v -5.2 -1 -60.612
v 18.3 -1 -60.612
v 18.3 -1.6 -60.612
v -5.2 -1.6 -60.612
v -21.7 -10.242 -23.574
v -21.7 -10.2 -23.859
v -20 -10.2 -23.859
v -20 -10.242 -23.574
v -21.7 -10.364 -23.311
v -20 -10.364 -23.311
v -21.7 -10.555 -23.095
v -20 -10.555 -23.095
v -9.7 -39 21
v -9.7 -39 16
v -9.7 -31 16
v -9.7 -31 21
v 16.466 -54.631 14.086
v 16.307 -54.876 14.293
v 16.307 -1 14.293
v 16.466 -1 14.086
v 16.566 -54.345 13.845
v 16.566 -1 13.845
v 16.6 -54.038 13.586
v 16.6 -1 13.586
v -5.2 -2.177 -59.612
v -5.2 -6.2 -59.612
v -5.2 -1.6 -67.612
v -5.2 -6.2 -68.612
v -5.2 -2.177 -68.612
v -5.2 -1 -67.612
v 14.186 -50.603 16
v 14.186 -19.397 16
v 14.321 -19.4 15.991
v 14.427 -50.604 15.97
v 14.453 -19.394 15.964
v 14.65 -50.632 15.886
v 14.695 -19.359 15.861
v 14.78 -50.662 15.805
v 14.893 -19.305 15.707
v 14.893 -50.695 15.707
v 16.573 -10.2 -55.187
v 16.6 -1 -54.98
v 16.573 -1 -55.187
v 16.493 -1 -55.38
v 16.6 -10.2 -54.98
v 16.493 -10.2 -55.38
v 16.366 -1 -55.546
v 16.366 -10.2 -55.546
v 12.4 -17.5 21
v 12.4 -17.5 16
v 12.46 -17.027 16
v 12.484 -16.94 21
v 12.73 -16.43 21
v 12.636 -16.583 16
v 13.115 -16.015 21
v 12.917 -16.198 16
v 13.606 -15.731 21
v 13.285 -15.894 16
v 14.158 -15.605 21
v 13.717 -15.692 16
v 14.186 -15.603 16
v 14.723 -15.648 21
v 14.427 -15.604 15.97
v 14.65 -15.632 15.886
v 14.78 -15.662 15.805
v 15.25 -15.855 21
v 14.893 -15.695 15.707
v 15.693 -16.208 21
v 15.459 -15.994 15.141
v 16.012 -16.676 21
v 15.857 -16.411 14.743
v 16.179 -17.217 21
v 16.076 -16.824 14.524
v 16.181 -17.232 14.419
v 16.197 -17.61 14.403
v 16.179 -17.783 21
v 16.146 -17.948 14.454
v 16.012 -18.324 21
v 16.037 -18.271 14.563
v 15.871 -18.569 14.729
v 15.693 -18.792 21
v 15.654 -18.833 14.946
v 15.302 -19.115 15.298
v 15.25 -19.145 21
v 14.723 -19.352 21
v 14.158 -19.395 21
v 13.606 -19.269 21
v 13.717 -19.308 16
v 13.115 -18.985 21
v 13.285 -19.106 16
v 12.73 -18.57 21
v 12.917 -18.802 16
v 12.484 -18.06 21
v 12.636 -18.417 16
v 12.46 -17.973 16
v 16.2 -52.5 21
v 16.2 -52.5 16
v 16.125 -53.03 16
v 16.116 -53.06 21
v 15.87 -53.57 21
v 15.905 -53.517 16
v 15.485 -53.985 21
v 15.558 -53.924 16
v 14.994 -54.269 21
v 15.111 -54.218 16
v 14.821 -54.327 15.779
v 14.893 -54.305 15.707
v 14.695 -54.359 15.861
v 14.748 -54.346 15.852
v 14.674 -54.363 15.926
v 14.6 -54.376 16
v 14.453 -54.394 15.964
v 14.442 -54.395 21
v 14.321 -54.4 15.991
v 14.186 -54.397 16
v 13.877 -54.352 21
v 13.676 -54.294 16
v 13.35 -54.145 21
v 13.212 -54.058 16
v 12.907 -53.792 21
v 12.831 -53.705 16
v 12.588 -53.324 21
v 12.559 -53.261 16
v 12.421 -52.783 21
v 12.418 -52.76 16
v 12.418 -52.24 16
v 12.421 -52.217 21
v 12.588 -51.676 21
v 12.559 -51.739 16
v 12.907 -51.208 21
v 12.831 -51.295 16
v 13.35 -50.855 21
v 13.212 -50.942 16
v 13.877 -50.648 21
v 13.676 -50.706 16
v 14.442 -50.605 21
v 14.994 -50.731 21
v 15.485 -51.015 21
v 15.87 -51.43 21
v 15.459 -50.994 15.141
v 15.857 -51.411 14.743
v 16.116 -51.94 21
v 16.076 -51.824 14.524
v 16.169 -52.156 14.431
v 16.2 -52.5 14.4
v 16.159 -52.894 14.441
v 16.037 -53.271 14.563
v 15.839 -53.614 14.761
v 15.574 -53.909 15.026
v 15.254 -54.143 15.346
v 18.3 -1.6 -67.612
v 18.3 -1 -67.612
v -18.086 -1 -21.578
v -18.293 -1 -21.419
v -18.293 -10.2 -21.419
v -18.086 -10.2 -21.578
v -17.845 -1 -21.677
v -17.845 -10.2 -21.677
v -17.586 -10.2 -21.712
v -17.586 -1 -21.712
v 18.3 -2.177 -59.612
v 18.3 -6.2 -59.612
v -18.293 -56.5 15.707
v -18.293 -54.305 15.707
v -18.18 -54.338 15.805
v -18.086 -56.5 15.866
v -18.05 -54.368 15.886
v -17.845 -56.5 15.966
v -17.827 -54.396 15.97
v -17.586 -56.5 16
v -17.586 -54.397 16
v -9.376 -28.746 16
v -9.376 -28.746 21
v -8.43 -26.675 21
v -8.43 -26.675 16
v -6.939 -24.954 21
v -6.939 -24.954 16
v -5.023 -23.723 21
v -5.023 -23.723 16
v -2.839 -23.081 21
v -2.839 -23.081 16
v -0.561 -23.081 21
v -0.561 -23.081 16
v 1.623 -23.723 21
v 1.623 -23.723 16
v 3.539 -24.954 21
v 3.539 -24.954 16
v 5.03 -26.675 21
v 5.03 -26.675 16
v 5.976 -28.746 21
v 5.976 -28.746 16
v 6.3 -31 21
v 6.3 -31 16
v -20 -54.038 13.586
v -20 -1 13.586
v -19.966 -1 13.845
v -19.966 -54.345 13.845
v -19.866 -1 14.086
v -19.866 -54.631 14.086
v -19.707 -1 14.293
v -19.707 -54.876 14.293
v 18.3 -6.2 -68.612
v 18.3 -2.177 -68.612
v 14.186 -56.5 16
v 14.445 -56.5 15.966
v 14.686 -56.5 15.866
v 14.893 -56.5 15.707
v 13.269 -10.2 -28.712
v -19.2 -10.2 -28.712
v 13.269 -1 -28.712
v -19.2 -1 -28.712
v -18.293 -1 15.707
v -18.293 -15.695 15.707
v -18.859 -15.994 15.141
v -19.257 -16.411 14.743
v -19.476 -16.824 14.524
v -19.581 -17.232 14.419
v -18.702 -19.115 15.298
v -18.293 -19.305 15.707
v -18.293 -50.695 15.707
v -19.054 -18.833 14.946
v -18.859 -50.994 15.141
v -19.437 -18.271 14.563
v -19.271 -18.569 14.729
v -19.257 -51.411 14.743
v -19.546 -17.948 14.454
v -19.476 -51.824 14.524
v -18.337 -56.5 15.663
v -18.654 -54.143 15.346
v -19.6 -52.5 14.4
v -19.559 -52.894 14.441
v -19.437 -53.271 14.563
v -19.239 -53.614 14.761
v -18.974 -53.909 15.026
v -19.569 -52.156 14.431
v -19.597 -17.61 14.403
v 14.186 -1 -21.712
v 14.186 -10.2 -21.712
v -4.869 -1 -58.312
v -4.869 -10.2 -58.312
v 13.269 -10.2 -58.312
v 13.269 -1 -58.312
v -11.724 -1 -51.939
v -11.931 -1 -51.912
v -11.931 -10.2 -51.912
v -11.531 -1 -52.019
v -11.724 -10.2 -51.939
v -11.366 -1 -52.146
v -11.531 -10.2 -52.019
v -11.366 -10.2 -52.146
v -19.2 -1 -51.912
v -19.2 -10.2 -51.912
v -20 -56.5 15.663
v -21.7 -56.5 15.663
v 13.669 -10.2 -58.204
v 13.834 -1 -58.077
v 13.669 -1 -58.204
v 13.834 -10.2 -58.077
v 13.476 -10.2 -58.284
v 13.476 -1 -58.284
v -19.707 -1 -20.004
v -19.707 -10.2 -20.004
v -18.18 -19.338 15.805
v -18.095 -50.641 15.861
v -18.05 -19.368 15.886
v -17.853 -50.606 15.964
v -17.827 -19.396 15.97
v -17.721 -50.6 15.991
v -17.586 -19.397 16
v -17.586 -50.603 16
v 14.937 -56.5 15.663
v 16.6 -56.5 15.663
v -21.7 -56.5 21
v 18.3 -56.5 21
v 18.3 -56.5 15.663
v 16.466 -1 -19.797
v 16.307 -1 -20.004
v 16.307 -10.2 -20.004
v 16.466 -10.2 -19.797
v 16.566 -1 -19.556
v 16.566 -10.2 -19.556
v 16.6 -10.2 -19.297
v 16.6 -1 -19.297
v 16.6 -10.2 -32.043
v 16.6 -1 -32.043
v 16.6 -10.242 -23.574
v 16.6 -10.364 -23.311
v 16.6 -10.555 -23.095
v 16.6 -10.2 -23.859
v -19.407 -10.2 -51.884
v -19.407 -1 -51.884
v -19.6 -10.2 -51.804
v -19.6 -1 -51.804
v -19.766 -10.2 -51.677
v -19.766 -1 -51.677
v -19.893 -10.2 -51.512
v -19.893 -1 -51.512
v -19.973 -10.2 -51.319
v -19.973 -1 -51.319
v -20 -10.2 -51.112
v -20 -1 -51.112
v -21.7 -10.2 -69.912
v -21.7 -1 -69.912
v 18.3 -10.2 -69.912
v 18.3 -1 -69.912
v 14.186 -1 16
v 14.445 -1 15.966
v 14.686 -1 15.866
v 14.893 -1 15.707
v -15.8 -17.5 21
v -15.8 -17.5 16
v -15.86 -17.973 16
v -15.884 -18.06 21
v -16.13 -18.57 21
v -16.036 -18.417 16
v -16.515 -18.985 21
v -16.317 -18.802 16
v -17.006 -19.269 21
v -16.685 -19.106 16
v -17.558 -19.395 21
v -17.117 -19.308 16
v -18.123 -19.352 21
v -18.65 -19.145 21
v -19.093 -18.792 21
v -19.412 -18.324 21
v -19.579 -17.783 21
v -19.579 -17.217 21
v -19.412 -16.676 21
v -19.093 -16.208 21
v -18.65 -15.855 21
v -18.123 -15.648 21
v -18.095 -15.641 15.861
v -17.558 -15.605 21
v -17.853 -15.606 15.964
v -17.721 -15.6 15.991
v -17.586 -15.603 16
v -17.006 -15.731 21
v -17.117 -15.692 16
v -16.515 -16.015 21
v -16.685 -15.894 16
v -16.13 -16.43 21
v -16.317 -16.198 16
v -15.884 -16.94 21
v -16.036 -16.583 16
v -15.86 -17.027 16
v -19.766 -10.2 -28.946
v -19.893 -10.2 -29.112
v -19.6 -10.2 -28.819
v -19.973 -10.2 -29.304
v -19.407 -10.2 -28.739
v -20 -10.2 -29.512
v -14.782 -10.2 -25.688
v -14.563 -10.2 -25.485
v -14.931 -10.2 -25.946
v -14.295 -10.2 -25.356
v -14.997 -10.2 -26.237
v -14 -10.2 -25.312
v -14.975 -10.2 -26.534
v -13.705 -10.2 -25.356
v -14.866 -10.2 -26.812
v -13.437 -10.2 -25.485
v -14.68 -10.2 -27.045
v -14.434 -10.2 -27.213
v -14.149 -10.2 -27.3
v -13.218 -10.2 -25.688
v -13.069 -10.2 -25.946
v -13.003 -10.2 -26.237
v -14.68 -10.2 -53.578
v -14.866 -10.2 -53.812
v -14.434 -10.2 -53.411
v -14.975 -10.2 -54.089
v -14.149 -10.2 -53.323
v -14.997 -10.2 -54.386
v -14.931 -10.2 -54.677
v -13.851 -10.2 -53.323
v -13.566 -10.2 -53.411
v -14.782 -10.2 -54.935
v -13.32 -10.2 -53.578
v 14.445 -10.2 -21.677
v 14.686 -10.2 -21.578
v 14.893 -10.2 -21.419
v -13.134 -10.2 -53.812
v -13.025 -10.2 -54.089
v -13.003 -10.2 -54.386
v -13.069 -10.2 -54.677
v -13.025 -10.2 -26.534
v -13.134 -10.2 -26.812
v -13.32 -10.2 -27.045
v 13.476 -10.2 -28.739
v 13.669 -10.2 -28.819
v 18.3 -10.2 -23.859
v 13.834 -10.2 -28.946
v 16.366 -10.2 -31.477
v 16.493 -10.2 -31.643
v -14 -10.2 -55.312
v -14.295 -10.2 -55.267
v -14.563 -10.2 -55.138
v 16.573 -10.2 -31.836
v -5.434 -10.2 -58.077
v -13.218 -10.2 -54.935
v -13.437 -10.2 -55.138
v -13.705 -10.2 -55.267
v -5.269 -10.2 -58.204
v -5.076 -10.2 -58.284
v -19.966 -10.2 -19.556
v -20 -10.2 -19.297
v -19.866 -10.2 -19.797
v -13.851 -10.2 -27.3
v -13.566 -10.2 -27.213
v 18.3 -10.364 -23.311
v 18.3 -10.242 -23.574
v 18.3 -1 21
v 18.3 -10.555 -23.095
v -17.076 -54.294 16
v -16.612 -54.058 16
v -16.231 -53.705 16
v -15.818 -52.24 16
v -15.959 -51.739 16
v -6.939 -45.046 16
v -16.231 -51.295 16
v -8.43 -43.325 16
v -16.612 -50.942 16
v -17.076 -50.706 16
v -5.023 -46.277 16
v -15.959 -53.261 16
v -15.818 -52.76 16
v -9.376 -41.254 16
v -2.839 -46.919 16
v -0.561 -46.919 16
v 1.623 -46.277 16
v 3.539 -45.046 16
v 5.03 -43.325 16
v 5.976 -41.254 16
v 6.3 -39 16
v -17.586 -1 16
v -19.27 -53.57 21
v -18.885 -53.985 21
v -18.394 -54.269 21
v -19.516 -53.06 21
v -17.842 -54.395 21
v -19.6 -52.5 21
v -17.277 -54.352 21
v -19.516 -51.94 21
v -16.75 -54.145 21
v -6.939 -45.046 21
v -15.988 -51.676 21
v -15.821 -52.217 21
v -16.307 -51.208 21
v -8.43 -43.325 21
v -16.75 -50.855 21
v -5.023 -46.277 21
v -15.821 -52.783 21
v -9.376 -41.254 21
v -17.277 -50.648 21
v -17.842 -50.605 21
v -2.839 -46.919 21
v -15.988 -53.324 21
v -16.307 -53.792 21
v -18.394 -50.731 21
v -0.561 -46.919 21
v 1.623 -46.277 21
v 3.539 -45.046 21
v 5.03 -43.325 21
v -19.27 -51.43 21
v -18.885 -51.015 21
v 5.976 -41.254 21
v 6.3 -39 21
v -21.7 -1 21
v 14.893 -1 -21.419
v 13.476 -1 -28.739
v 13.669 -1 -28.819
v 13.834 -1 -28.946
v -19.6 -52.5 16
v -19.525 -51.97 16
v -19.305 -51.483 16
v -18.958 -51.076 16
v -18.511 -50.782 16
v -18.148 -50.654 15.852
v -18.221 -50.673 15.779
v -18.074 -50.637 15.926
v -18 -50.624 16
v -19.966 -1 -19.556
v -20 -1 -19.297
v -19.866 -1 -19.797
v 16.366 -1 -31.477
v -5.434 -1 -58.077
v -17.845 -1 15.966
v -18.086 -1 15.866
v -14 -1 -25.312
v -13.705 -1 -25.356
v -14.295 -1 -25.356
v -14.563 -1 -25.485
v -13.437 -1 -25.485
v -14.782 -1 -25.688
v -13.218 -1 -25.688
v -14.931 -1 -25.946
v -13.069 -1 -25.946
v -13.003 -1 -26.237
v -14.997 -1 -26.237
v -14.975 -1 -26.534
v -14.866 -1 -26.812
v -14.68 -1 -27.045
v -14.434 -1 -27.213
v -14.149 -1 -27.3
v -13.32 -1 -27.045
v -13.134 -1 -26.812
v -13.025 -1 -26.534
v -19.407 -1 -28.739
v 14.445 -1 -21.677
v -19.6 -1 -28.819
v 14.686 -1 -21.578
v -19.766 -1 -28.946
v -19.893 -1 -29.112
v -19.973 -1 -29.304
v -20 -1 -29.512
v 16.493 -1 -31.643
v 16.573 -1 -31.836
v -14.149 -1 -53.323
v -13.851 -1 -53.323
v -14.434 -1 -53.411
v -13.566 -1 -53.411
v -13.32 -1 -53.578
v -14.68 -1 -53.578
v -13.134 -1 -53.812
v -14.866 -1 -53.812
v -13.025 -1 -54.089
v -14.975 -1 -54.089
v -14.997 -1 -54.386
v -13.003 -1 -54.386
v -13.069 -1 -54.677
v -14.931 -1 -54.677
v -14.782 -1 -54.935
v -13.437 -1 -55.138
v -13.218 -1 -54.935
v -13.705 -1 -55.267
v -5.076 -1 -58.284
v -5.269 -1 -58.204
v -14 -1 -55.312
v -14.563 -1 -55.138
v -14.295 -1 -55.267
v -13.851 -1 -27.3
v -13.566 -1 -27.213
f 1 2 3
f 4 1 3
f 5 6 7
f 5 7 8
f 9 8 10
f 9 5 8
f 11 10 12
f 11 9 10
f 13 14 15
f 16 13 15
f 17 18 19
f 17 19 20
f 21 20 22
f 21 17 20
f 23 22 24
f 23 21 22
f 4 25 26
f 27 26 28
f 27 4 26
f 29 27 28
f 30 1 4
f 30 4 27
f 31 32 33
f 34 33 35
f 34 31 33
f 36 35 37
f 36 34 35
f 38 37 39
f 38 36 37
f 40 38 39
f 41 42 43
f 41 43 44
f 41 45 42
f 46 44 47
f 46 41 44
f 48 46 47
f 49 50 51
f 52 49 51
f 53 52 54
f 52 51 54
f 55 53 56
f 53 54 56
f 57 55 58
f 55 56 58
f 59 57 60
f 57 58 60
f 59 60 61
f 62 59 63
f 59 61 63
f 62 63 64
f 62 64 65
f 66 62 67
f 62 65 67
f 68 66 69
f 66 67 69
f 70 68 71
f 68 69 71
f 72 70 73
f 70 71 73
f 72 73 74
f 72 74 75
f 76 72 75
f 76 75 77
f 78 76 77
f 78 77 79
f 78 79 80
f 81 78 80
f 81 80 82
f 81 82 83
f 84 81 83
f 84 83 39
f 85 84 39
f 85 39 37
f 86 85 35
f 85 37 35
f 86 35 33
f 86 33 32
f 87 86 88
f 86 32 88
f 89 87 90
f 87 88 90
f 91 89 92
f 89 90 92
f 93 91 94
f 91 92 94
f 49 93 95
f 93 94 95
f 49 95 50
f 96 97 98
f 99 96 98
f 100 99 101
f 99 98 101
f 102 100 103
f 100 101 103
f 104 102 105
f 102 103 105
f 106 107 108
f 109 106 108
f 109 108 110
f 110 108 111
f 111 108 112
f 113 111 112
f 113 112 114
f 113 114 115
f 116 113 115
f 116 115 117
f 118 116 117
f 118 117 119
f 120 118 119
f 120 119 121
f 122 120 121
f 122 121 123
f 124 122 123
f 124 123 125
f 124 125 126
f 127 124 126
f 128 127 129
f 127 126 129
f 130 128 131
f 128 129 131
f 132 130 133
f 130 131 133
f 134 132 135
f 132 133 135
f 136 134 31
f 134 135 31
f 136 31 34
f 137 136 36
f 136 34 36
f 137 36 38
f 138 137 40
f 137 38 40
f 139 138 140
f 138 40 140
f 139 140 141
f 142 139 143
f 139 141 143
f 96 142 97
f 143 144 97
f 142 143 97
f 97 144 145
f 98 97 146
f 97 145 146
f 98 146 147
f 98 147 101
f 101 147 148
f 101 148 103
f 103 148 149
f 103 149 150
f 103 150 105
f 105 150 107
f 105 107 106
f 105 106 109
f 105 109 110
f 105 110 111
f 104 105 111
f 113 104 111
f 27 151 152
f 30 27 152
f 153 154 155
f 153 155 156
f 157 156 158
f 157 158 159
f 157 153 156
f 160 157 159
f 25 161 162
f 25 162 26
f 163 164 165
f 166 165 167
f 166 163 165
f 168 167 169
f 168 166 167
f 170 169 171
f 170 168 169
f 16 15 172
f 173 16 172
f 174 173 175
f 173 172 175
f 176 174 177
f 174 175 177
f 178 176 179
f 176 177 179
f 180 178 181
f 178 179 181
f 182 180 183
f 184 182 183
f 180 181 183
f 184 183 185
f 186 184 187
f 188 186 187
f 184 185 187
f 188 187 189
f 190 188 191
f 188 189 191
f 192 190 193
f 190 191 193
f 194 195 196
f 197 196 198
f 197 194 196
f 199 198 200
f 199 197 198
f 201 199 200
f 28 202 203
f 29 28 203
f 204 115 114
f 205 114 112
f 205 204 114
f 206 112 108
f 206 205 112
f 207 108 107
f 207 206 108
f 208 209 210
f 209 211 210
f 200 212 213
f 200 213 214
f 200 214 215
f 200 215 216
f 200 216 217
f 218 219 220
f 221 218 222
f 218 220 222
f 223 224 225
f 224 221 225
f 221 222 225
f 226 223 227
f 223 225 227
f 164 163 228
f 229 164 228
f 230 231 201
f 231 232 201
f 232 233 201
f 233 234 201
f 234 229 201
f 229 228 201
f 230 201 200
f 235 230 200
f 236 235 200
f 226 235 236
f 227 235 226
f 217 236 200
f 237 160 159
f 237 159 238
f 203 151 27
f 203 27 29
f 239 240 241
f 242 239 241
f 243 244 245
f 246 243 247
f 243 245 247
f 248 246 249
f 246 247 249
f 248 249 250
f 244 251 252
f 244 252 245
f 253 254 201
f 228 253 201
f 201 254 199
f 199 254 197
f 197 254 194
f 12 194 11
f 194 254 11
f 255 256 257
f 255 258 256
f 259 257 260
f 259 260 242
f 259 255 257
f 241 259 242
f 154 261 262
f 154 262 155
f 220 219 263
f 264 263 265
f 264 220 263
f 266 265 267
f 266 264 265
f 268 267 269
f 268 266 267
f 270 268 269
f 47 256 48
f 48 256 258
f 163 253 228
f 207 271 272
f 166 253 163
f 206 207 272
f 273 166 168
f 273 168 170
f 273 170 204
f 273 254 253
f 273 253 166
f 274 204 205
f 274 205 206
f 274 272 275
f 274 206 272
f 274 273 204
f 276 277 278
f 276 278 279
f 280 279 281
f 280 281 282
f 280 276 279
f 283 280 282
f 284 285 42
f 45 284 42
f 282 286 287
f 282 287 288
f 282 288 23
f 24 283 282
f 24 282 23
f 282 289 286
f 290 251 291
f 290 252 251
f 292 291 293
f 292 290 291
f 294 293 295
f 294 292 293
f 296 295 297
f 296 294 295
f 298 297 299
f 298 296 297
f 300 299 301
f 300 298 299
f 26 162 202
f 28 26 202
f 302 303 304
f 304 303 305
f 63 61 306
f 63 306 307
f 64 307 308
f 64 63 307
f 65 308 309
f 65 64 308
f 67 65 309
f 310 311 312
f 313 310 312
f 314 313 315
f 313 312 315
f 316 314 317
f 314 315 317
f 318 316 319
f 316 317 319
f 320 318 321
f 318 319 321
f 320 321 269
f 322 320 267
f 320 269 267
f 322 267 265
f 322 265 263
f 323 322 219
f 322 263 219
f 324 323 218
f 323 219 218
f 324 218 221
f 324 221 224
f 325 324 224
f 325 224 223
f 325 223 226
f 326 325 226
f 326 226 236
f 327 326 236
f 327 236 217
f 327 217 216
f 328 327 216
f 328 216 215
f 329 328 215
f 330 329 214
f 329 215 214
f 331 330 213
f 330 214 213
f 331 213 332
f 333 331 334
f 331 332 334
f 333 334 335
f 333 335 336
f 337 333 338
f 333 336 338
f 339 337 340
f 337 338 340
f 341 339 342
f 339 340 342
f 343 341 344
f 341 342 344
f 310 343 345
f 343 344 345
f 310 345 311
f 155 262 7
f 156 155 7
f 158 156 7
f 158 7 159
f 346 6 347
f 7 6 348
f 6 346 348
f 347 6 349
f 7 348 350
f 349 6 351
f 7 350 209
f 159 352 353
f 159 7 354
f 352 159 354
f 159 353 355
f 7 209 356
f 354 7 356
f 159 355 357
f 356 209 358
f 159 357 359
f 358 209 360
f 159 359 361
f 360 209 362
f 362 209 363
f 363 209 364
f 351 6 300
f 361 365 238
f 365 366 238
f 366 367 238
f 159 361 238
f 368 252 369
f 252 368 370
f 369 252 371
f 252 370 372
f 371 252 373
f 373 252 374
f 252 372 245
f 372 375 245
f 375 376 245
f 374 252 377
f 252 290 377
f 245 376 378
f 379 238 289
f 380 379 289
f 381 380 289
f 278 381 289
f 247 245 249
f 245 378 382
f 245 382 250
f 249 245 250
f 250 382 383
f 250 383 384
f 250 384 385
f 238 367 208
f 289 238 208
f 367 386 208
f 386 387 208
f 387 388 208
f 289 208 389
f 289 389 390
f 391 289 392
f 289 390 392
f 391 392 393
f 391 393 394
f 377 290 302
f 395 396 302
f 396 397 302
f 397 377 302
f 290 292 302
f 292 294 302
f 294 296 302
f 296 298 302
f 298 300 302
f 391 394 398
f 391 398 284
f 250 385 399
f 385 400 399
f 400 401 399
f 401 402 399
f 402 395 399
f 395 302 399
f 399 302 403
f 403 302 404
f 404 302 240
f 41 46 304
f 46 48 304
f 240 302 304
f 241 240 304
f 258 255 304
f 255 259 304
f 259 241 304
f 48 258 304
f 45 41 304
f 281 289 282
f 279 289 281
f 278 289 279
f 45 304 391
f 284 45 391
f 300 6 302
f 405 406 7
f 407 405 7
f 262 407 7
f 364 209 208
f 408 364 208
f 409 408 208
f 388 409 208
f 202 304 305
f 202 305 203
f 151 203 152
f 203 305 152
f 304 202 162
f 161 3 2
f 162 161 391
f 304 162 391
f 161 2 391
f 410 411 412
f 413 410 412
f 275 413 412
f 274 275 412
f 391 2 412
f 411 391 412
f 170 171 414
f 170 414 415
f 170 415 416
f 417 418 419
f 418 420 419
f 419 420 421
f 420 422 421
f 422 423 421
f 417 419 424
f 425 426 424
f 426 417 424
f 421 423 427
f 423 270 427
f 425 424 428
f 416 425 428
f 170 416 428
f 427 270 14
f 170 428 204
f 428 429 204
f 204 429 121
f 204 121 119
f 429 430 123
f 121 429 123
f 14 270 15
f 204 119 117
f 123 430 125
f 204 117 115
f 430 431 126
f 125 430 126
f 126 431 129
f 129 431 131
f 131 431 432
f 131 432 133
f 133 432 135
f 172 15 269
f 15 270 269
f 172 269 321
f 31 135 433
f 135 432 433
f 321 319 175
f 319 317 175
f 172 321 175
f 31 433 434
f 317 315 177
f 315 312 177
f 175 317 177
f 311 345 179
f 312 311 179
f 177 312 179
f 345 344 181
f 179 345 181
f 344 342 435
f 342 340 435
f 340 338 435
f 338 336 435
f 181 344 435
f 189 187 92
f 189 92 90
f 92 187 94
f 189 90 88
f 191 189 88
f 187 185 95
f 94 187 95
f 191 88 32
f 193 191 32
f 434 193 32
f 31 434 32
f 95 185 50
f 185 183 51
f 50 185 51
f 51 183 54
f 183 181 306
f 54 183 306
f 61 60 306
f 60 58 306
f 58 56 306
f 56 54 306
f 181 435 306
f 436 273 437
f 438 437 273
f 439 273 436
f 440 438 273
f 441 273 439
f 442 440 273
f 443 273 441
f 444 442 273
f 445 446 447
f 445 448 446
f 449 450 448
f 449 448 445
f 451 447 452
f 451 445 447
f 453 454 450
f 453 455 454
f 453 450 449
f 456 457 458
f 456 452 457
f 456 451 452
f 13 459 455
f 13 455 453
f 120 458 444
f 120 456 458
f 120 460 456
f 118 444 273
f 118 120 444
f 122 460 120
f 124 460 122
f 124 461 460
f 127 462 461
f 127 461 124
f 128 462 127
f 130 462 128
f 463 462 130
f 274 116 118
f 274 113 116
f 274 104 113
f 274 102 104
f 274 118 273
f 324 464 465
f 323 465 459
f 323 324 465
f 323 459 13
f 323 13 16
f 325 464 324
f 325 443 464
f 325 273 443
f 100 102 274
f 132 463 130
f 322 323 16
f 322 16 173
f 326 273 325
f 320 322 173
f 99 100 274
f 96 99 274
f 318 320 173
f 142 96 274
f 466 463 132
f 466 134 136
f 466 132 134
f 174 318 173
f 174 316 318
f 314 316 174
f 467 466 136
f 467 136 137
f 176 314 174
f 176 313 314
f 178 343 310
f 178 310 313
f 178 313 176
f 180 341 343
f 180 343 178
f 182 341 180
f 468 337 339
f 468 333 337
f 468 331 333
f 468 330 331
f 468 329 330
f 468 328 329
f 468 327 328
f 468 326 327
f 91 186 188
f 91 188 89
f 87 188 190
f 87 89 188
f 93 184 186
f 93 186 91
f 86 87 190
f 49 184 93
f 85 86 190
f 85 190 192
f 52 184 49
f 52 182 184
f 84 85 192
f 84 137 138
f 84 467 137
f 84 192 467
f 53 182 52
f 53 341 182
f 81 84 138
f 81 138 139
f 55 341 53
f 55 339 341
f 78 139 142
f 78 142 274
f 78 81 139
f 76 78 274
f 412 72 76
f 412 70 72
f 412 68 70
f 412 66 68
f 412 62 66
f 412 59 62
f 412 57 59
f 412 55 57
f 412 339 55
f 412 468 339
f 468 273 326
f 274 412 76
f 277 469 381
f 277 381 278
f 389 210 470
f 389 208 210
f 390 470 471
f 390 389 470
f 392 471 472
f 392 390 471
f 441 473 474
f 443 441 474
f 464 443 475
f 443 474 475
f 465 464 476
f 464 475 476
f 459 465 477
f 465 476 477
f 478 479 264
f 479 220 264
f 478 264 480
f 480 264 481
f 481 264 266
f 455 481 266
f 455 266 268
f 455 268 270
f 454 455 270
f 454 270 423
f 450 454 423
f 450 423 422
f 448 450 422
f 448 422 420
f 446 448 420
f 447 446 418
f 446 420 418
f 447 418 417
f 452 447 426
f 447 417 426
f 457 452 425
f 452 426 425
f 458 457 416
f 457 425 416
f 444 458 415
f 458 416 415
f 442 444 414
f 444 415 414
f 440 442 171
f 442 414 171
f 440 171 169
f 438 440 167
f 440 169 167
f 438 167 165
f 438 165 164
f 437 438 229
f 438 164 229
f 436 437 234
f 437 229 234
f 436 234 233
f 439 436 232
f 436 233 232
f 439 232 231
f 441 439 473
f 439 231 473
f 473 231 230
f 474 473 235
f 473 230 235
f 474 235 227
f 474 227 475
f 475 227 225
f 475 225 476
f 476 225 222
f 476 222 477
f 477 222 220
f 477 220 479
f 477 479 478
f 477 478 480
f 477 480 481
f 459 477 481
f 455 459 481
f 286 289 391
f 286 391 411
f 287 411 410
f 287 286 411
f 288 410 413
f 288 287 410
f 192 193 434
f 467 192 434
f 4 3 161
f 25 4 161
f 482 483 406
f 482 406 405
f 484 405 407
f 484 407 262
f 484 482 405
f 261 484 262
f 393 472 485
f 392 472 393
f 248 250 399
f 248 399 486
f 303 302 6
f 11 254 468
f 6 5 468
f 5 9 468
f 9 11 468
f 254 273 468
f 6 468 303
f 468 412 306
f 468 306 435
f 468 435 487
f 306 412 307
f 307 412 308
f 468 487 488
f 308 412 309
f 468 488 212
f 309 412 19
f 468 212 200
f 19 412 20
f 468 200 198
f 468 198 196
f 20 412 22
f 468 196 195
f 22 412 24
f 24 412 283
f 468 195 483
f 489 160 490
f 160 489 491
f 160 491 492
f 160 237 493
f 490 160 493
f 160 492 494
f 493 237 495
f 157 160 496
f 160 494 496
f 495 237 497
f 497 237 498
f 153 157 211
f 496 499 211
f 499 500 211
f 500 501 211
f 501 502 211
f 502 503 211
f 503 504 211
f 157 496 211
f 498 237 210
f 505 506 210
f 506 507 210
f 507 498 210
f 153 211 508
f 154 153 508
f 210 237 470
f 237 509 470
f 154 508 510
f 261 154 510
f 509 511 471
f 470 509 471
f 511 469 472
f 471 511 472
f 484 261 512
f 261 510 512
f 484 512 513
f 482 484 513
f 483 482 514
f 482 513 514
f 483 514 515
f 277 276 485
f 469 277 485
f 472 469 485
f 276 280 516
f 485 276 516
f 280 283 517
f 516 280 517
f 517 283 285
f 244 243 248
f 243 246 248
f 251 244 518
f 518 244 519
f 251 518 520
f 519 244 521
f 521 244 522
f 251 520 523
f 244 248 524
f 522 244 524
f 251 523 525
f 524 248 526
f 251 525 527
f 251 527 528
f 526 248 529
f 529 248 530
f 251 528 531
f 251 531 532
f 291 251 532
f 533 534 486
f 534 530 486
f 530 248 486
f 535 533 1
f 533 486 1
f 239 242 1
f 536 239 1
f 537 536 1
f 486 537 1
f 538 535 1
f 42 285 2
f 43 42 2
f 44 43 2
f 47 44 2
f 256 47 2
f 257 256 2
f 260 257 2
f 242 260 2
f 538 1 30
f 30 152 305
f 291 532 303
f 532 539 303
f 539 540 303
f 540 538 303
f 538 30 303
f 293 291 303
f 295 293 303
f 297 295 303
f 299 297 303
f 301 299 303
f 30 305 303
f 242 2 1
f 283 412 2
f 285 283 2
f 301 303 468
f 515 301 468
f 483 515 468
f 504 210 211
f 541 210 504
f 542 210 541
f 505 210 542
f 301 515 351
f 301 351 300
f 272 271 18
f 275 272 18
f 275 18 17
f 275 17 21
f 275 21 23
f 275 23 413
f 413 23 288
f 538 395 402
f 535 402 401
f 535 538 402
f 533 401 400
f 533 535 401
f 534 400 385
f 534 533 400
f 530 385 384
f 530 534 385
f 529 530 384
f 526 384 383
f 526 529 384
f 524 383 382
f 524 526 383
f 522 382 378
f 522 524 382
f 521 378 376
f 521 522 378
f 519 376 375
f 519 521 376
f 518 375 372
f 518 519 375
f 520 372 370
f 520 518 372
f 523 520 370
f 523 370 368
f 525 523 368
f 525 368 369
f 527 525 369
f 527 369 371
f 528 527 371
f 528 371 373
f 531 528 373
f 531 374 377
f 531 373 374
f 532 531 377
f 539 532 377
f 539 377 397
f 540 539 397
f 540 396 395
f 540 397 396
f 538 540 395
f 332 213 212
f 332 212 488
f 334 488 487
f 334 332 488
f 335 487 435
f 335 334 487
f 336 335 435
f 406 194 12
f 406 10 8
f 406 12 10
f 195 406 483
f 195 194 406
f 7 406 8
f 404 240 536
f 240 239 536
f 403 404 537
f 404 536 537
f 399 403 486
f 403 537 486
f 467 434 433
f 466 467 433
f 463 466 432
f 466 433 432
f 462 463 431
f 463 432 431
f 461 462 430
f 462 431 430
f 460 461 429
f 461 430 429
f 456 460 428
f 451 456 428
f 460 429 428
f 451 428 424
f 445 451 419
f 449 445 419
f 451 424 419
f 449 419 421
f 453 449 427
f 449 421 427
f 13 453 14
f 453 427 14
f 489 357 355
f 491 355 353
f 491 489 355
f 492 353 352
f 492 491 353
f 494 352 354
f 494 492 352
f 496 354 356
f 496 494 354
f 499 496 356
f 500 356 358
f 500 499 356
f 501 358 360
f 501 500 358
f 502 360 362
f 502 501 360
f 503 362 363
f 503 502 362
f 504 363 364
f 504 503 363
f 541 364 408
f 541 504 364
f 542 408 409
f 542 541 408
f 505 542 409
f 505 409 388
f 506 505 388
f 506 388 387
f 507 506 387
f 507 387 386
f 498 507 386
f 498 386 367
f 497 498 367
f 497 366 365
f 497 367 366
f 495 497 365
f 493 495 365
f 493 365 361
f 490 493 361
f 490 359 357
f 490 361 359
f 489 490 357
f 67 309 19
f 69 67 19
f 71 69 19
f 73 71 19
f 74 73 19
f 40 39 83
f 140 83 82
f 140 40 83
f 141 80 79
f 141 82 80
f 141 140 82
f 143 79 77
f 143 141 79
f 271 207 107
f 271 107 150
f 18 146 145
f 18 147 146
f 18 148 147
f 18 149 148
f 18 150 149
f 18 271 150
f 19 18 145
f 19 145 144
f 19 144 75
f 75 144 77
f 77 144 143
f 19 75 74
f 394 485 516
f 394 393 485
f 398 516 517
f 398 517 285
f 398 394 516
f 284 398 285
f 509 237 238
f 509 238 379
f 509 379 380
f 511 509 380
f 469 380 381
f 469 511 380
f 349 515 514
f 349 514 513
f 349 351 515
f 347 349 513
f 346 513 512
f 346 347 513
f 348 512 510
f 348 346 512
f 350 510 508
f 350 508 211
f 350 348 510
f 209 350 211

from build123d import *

# Parameters (mm, degrees)
BOSS_EXTRUDE1_START      = -1
SKETCH1_W                = 1.7
SKETCH1_H                = 89.2
BOSS_EXTRUDE1_DEPTH      = 9.2
SKETCH4_W                = 40
SKETCH4_H                = 11.6
BOSS_EXTRUDE3_DEPTH      = 9.2
SERVO_HOLDER_DEPTH       = 1
SERVO_HOLDER_DEPTH_BACK  = 9.2
SKETCH3_W                = 14
SKETCH3_H                = 7
SKETCH3_R                = 1
SKETCH37_W               = 26
SKETCH37_H               = 7
BOSS_EXTRUDE19_DEPTH     = 10.2
CUT_EXTRUDE10_DEPTH      = 93.482268571
CUT_EXTRUDE10_DEPTH_BACK = 93.482268571
SKETCH29_W               = 49.101454262
SKETCH29_H               = 5.977389624
BOSS_EXTRUDE17_DEPTH     = 3
SKETCH39_W               = 1.7
SKETCH39_H               = 41.2
BOSS_EXTRUDE20_DEPTH     = 9.2
CUT_EXTRUDE13_DEPTH      = 23.5
CHAMFER2_SIZE            = 0.6
CHAMFER2_SIZE_2          = 1.039230485
CHAMFER3_SIZE            = 3
CHAMFER4_SIZE            = 2.5
CUT_EXTRUDE16_DEPTH      = 10
FILLET11_R               = 0.8
SKETCH51_W               = 40
SKETCH51_H               = 41
CUT_EXTRUDE17_DEPTH      = 10
SKETCH50_W               = 40
SKETCH50_H               = 55.5
SKETCH50_R               = 1.9
BOSS_EXTRUDE24_DEPTH     = 5
SKETCH53_W               = 1.7
SKETCH53_H               = 37.711538462
BOSS_EXTRUDE25_DEPTH     = 9.2
CHAMFER6_START           = -21.7
CHAMFER6_DEPTH           = 1.7
CHAMFER6_START_2         = 16.6
CHAMFER6_2_DEPTH         = 1.7
CHAMFER5_SIZE            = 2
FILLET13_R               = 1


with BuildPart() as part:
    # Sketch1 → Boss-Extrude1 (new body)
    with BuildSketch(Plane(origin=(0, 0, 0), x_dir=(1, 0, 0), z_dir=(0, 1, 0)).offset(BOSS_EXTRUDE1_START)):
        with Locations((-20.85, 25.311538462)):
            Rectangle(SKETCH1_W, SKETCH1_H)
    extrude(amount=-BOSS_EXTRUDE1_DEPTH)

    # Sketch4 → Boss-Extrude3 (add)
    with BuildSketch(Plane.XZ.offset(10.2)):
        with Locations((-1.7, -64.111538462)):
            Rectangle(SKETCH4_W, SKETCH4_H)
    extrude(amount=-BOSS_EXTRUDE3_DEPTH)

    # Sketch3 → Servo Holder (add, two sides: drawn at the far end of the back side and taken through both)
    # profile 1 of 2: a face of its own
    with BuildSketch(Plane.XZ.offset(10.2).offset(-SERVO_HOLDER_DEPTH_BACK)):
        with Locations((-14.7, -55.411538462)):
            Rectangle(SKETCH3_W, SKETCH3_H)
        with Locations(Location((-14, -54.311538462, 0), (0, 0, 270))):
            Circle(SKETCH3_R, mode=Mode.SUBTRACT)
    # profile 2 of 2: a face of its own
    with BuildSketch(Plane.XZ.offset(10.2).offset(-SERVO_HOLDER_DEPTH_BACK)):
        with Locations((-14.7, -25.211538462)):
            Rectangle(SKETCH3_W, SKETCH3_H)
        with Locations(Location((-14, -26.311538462, 0), (0, 0, 90))):
            Circle(SKETCH3_R, mode=Mode.SUBTRACT)
    extrude(amount=SERVO_HOLDER_DEPTH + SERVO_HOLDER_DEPTH_BACK)

    # Sketch37 → Boss-Extrude19 (add)
    with BuildSketch(Plane(origin=(0, -1, 0), x_dir=(1, 0, 0), z_dir=(0, 1, 0))):
        with Locations((5.3, 25.211538462)):
            Rectangle(SKETCH37_W, SKETCH37_H)
    extrude(amount=-BOSS_EXTRUDE19_DEPTH)

    # Sketch29 → Cut-Extrude10 (cut, two sides: drawn at the far end of the back side and taken through both)
    with BuildSketch(Plane(origin=(0, 0, -69.911538462), x_dir=(-1, 0, 0), z_dir=(0, 0, -1)).offset(-CUT_EXTRUDE10_DEPTH_BACK)):
        with Locations((-2.850727131, -13.188694812)):
            Rectangle(SKETCH29_W, SKETCH29_H)
    extrude(amount=CUT_EXTRUDE10_DEPTH + CUT_EXTRUDE10_DEPTH_BACK, mode=Mode.SUBTRACT)

    # Sketch35 → Boss-Extrude17 (add)
    with BuildSketch(Plane(origin=(18.3, 0, 0), x_dir=(0, 0, -1), z_dir=(1, 0, 0))):
        Polygon((-2, -1), (21.711538462, -1), (21.711538462, -10.2), (-19.288461538, -10.2), (-19.288461538, -1), align=None)
    extrude(amount=-BOSS_EXTRUDE17_DEPTH)

    # Sketch39 → Boss-Extrude20 (add)
    with BuildSketch(Plane(origin=(0, -1, 0), x_dir=(1, 0, 0), z_dir=(0, 1, 0))):
        with Locations((17.45, 49.311538462)):
            Rectangle(SKETCH39_W, SKETCH39_H)
    extrude(amount=-BOSS_EXTRUDE20_DEPTH)

    # Sketch40 → Cut-Extrude13 (cut)
    with BuildSketch(Plane(origin=(18.3, 0, 0), x_dir=(0, 0, -1), z_dir=(1, 0, 0))):
        Polygon((64.111538462, -1), (60.611538462, -1), (60.611538462, -2.2), (59.611538462, -2.2), (59.611538462, -6.2), (64.111538462, -6.2), align=None)
        Polygon((67.611538462, -1), (64.111538462, -1), (64.111538462, -6.2), (68.611538462, -6.2), (68.611538462, -2.2), (67.611538462, -2.2), align=None)
    extrude(amount=-CUT_EXTRUDE13_DEPTH, mode=Mode.SUBTRACT)

    # Chamfer2
    # the kernel refuses this chamfer: 1.039230485, 0.6 mm, written as the material it takes off along each edge
    with BuildSketch(Plane(origin=(20.988578382, -2.2, -60.611538462), x_dir=(0, 1, 0), z_dir=(-1, 0, 0))) as chamfer2_piece_1_section:
        Polygon((CHAMFER2_SIZE, 0), (0, -CHAMFER2_SIZE_2), (0, 0), align=None)
    chamfer2_piece_1 = extrude(amount=26.188578382, mode=Mode.PRIVATE)
    chamfer2_piece_1 = split(chamfer2_piece_1, bisect_by=Plane(origin=(20.988578382, -2.2, -59.611538462), z_dir=(0, 0, -1)), keep=Keep.TOP, mode=Mode.PRIVATE)
    add(chamfer2_piece_1, mode=Mode.SUBTRACT)
    with BuildSketch(Plane(origin=(20.988578382, -2.2, -67.611538462), x_dir=(0, 1, 0), z_dir=(-1, 0, 0))) as chamfer2_piece_2_section:
        Polygon((CHAMFER2_SIZE, 0), (0, CHAMFER2_SIZE_2), (0, 0), align=None)
    chamfer2_piece_2 = extrude(amount=26.188578382, mode=Mode.PRIVATE)
    chamfer2_piece_2 = split(chamfer2_piece_2, bisect_by=Plane(origin=(20.988578382, -2.2, -68.611538462), z_dir=(0, 0, 1)), keep=Keep.TOP, mode=Mode.PRIVATE)
    add(chamfer2_piece_2, mode=Mode.SUBTRACT)

    # Chamfer3
    chamfer3_edges = [part.edges().sort_by_distance(p)[0] for p in [
        (16.6, -5.6, -58.311538462),
        (16.6, -5.6, -28.711538462),
    ]]
    chamfer(chamfer3_edges, length=CHAMFER3_SIZE)

    # Chamfer4
    chamfer4_edges = [part.edges().sort_by_distance(p)[0] for p in [
        (-7.7, -5.6, -58.311538462),
    ]]
    chamfer(chamfer4_edges, length=CHAMFER4_SIZE)

    # Sketch43 → Cut-Extrude16 (cut)
    with BuildSketch(Plane(origin=(0, -1, 0), x_dir=(1, 0, 0), z_dir=(0, 1, 0))):
        Polygon((-5.2, 58.311538462), (-11.6, 51.911538462), (-5.2, 51.911538462), align=None)
    extrude(amount=-CUT_EXTRUDE16_DEPTH, mode=Mode.SUBTRACT)

    # Fillet11
    fillet11_edges = [part.edges().sort_by_distance(p)[0] for p in [
        (16.6, -5.6, -55.311538462),
        (16.6, -5.6, -31.711538462),
        (13.6, -5.6, -28.711538462),
        (13.6, -5.6, -58.311538462),
        (-5.2, -5.6, -58.311538462),
        (-11.6, -5.6, -51.911538462),
        (-20, -5.6, -51.911538462),
        (-20, -5.6, -28.711538462),
    ]]
    fillet(fillet11_edges, radius=FILLET11_R)

    # Sketch51 → Cut-Extrude17 (cut)
    with BuildSketch(Plane(origin=(0, -1, 0), x_dir=(1, 0, 0), z_dir=(0, 1, 0))):
        with Locations((-1.7, 1.211538462)):
            Rectangle(SKETCH51_W, SKETCH51_H)
    extrude(amount=-CUT_EXTRUDE17_DEPTH, mode=Mode.SUBTRACT)



with BuildPart() as body_2:
    # Sketch50 → Boss-Extrude24 (new body)
    with BuildSketch(Plane.XY.offset(16)):
        with Locations((-1.7, -28.75)):
            Rectangle(SKETCH50_W, SKETCH50_H)
        with Locations((-17.7, -17.5)):
            Circle(SKETCH50_R, mode=Mode.SUBTRACT)
        with Locations(Location((14.3, -17.5, 0), (0, 0, 180))):
            Circle(SKETCH50_R, mode=Mode.SUBTRACT)
        with Locations((14.3, -52.5)):
            Circle(SKETCH50_R, mode=Mode.SUBTRACT)
        with Locations(Location((-17.7, -52.5, 0), (0, 0, 180))):
            Circle(SKETCH50_R, mode=Mode.SUBTRACT)
        with BuildLine():
            Line((6.3, -31), (6.3, -39))
            ThreePointArc((6.3, -39), (-1.7, -47), (-9.7, -39))
            Line((-9.7, -39), (-9.7, -31))
            ThreePointArc((-9.7, -31), (-1.7, -23), (6.3, -31))
        make_face(mode=Mode.SUBTRACT)
    extrude(amount=BOSS_EXTRUDE24_DEPTH)


with BuildPart() as part_1:
    add(part.part)

    add(body_2.part)  # Boss-Extrude25 merges body 2
    # Sketch53 → Boss-Extrude25 (add)
    with BuildSketch(Plane(origin=(0, -1, 0), x_dir=(1, 0, 0), z_dir=(0, 1, 0))):
        with Locations((17.45, 2.855769231)):
            Rectangle(SKETCH53_W, SKETCH53_H)
        with Locations((-20.85, 2.855769231)):
            Rectangle(SKETCH53_W, SKETCH53_H)
    extrude(amount=-BOSS_EXTRUDE25_DEPTH)

    # Chamfer6: read off the stored shape, not the designer's step
    # Chamfer6 outline → Chamfer6 (add)
    with BuildSketch(Plane.YZ.offset(CHAMFER6_START)):
        Polygon((-56.5, 16), (-56.5, 15.662571698), (-10.2, -23.394754297), (-10.2, 16), align=None)
    extrude(amount=CHAMFER6_DEPTH)

    # Chamfer6 2 outline → Chamfer6 2 (add)
    with BuildSketch(Plane.YZ.offset(CHAMFER6_START_2)):
        Polygon((-56.5, 16), (-56.5, 15.662571698), (-10.2, -23.394754297), (-10.2, 16), align=None)
    extrude(amount=CHAMFER6_2_DEPTH)

    # Chamfer5
    # the kernel refuses this chamfer: 2 mm, written as the material it adds along each edge
    with BuildSketch(Plane(origin=(16.6, -1, -21.711538462), x_dir=(-1, 0, 0), z_dir=(0, -1, 0)), Plane(origin=(-20, -1, -21.711538462), x_dir=(0, 0, 1), z_dir=(0, -1, 0))) as chamfer5_piece_1:
        Polygon((CHAMFER5_SIZE, 0), (0, -CHAMFER5_SIZE), (0, 0), align=None)
    extrude(amount=9.2)
    with BuildSketch(Plane(origin=(16.6, -56.5, 16), x_dir=(-1, 0, 0), z_dir=(0, 1, 0))) as chamfer5_piece_2_section:
        Polygon((CHAMFER5_SIZE, 0), (0, -CHAMFER5_SIZE), (0, 0), align=None)
    chamfer5_piece_2 = extrude(amount=55.5, mode=Mode.PRIVATE)
    chamfer5_piece_2 = chamfer5_piece_2 - Plane(origin=(14.3, -52.5, 16), x_dir=(1, 0, 0), z_dir=(0, 0, -1)) * Cylinder(1.9, 119, mode=Mode.PRIVATE)
    chamfer5_piece_2 = chamfer5_piece_2 - Plane(origin=(14.3, -17.5, 16), x_dir=(-1, 0, 0), z_dir=(0, 0, -1)) * Cylinder(1.9, 119, mode=Mode.PRIVATE)
    chamfer5_piece_2 = split(chamfer5_piece_2, bisect_by=Plane(origin=(16.6, -56.666302124, 15.802859306), z_dir=(0, 0.6447909042653838, 0.7643590058190123)), keep=Keep.TOP, mode=Mode.PRIVATE)
    add(chamfer5_piece_2)
    with BuildSketch(Plane(origin=(-20, -56.5, 16), x_dir=(1, 0, 0), z_dir=(0, 1, 0))) as chamfer5_piece_3_section:
        Polygon((CHAMFER5_SIZE, 0), (0, CHAMFER5_SIZE), (0, 0), align=None)
    chamfer5_piece_3 = extrude(amount=55.5, mode=Mode.PRIVATE)
    chamfer5_piece_3 = chamfer5_piece_3 - Plane(origin=(-17.7, -52.5, 16), x_dir=(-1, 0, 0), z_dir=(0, 0, -1)) * Cylinder(1.9, 119, mode=Mode.PRIVATE)
    chamfer5_piece_3 = chamfer5_piece_3 - Plane(origin=(-17.7, -17.5, 16), x_dir=(1, 0, 0), z_dir=(0, 0, -1)) * Cylinder(1.9, 119, mode=Mode.PRIVATE)
    chamfer5_piece_3 = split(chamfer5_piece_3, bisect_by=Plane(origin=(-20, -56.666302124, 15.802859306), z_dir=(0, 0.6447909042653838, 0.7643590058190123)), keep=Keep.TOP, mode=Mode.PRIVATE)
    add(chamfer5_piece_3)

    # Fillet13
    # the kernel refuses this fillet: 1 mm, written as the material it adds along each edge
    with BuildSketch(Plane(origin=(16.6, -55.564659873, 14), x_dir=(-0.7071067811865454, 0, 0.7071067811865497), z_dir=(0, 1, 0))) as fillet13_piece_1_section:
        with BuildLine():
            CenterArc((FILLET13_R * 0.414213562373, -FILLET13_R), FILLET13_R, 90, 45)
            Line((-FILLET13_R * 0.292893218813, -FILLET13_R * 0.292893218813), (0, 0))
            Line((0, 0), (FILLET13_R * 0.414213562373, 0))
        make_face()
    fillet13_piece_1 = extrude(amount=54.564659873, mode=Mode.PRIVATE)
    fillet13_piece_1 = split(fillet13_piece_1, bisect_by=Plane(origin=(16.6, -55.134131152, 14.510364682), z_dir=(0, 0.6447909042651655, 0.7643590058191962)), keep=Keep.TOP, mode=Mode.PRIVATE)
    add(fillet13_piece_1)
    with BuildSketch(Plane(origin=(14.6, -16.659367602, 16), x_dir=(0.7071067811865475, 0, -0.7071067811865475), z_dir=(0, 1, 0))) as fillet13_piece_2_section:
        with BuildLine():
            CenterArc((FILLET13_R * 0.414213562373, FILLET13_R), FILLET13_R, 225, 45)
            Line((-FILLET13_R * 0.292893218813, FILLET13_R * 0.292893218813), (0, 0))
            Line((0, 0), (FILLET13_R * 0.414213562373, 0))
        make_face()
    fillet13_piece_2 = extrude(amount=15.659367602, mode=Mode.PRIVATE)
    fillet13_piece_2 = fillet13_piece_2 - Plane(origin=(14.3, -17.5, 16), x_dir=(-1, 0, 0), z_dir=(0, 0, -1)) * Cylinder(1.9, 33, mode=Mode.PRIVATE)
    add(fillet13_piece_2)
    with BuildSketch(Plane(origin=(14.6, -56.5, 16), x_dir=(0.7071067811865475, 0, -0.7071067811865475), z_dir=(0, 1, 0))) as fillet13_piece_3_section:
        with BuildLine():
            CenterArc((FILLET13_R * 0.414213562373, FILLET13_R), FILLET13_R, 225, 45)
            Line((-FILLET13_R * 0.292893218813, FILLET13_R * 0.292893218813), (0, 0))
            Line((0, 0), (FILLET13_R * 0.414213562373, 0))
        make_face()
    fillet13_piece_3 = extrude(amount=3.159367602, mode=Mode.PRIVATE)
    fillet13_piece_3 = fillet13_piece_3 - Plane(origin=(14.3, -52.5, 16), x_dir=(1, 0, 0), z_dir=(0, 0, -1)) * Cylinder(1.9, 8, mode=Mode.PRIVATE)
    add(fillet13_piece_3)
    with BuildSketch(Plane(origin=(16.6, -1, -19.711538462), x_dir=(0, 0, 1), z_dir=(0, -1, 0)), Plane(origin=(-18, -1, -21.711538462), x_dir=(1.0, 0, -1.0978572219633363e-12), z_dir=(0, -1, 0)), Plane(origin=(-20, -1, -19.711538462), x_dir=(0.7071067811865475, 0, -0.7071067811865475), z_dir=(0, -1, 0))) as fillet13_piece_4:
        with BuildLine():
            CenterArc((FILLET13_R * 0.414213562373, FILLET13_R), FILLET13_R, 225, 45)
            Line((-FILLET13_R * 0.292893218813, FILLET13_R * 0.292893218813), (0, 0))
            Line((0, 0), (FILLET13_R * 0.414213562373, 0))
        make_face()
    extrude(amount=9.2)
    with BuildSketch(Plane(origin=(14.6, -1, -21.711538462), x_dir=(-1.0, 0, -1.0978572219633363e-12), z_dir=(0, -1, 0))) as fillet13_piece_5:
        with BuildLine():
            CenterArc((FILLET13_R * 0.414213562372, -FILLET13_R), FILLET13_R, 90, 45)
            Line((-FILLET13_R * 0.292893218814, -FILLET13_R * 0.292893218813), (0, 0))
            Line((0, 0), (FILLET13_R * 0.414213562373, 0))
        make_face()
    extrude(amount=9.2)
    with BuildSketch(Plane(origin=(-18, -56.5, 16), x_dir=(-0.7071067811865475, 0, -0.7071067811865475), z_dir=(0, 1, 0))) as fillet13_piece_6_section:
        with BuildLine():
            CenterArc((FILLET13_R * 0.414213562373, -FILLET13_R), FILLET13_R, 90, 45)
            Line((-FILLET13_R * 0.292893218813, -FILLET13_R * 0.292893218813), (0, 0))
            Line((0, 0), (FILLET13_R * 0.414213562373, 0))
        make_face()
    fillet13_piece_6 = extrude(amount=3.159367602, mode=Mode.PRIVATE)
    fillet13_piece_6 = fillet13_piece_6 - Plane(origin=(-17.7, -52.5, 16), x_dir=(-1, 0, 0), z_dir=(0, 0, -1)) * Cylinder(1.9, 8, mode=Mode.PRIVATE)
    add(fillet13_piece_6)
    with BuildSketch(Plane(origin=(-18, -16.659367602, 16), x_dir=(-0.7071067811865475, 0, -0.7071067811865475), z_dir=(0, 1, 0))) as fillet13_piece_7_section:
        with BuildLine():
            CenterArc((FILLET13_R * 0.414213562373, -FILLET13_R), FILLET13_R, 90, 45)
            Line((-FILLET13_R * 0.292893218813, -FILLET13_R * 0.292893218813), (0, 0))
            Line((0, 0), (FILLET13_R * 0.414213562373, 0))
        make_face()
    fillet13_piece_7 = extrude(amount=15.659367602, mode=Mode.PRIVATE)
    fillet13_piece_7 = fillet13_piece_7 - Plane(origin=(-17.7, -17.5, 16), x_dir=(1, 0, 0), z_dir=(0, 0, -1)) * Cylinder(1.9, 33, mode=Mode.PRIVATE)
    add(fillet13_piece_7)
    with BuildSketch(Plane(origin=(-20, -55.564659873, 14), x_dir=(0.7071067811865475, 0, 0.7071067811865475), z_dir=(0, 1, 0))) as fillet13_piece_8_section:
        with BuildLine():
            CenterArc((FILLET13_R * 0.414213562373, FILLET13_R), FILLET13_R, 225, 45)
            Line((-FILLET13_R * 0.292893218813, FILLET13_R * 0.292893218813), (0, 0))
            Line((0, 0), (FILLET13_R * 0.414213562373, 0))
        make_face()
    fillet13_piece_8 = extrude(amount=54.564659873, mode=Mode.PRIVATE)
    fillet13_piece_8 = split(fillet13_piece_8, bisect_by=Plane(origin=(-20, -55.134131152, 14.510364682), z_dir=(0, 0.6447909042651655, 0.7643590058191962)), keep=Keep.TOP, mode=Mode.PRIVATE)
    add(fillet13_piece_8)
    with BuildSketch(Plane(origin=(16.6, -10.2, -23.394754297), x_dir=(0, 0, -1), z_dir=(1, 0, 0)), Plane(origin=(-21.7, -10.2, -23.394754297), x_dir=(0, 0, -1), z_dir=(1, 0, 0))) as fillet13_piece_9:
        with BuildLine():
            CenterArc((FILLET13_R * 0.464715000429, -FILLET13_R), FILLET13_R, 90, 49.85)
            Line((-FILLET13_R * 0.29964400539, -FILLET13_R * 0.355209095735), (0, 0))
            Line((0, 0), (FILLET13_R * 0.464715000429, 0))
        make_face()
    extrude(amount=1.7)
    with BuildSketch(Plane(origin=(-18, -51.659367602, 16), x_dir=(-0.7071067811865475, 0, -0.7071067811865475), z_dir=(0, 1, 0))) as fillet13_piece_10_section:
        with BuildLine():
            CenterArc((FILLET13_R * 0.414213562373, -FILLET13_R), FILLET13_R, 90, 45)
            Line((-FILLET13_R * 0.292893218813, -FILLET13_R * 0.292893218813), (0, 0))
            Line((0, 0), (FILLET13_R * 0.414213562373, 0))
        make_face()
    fillet13_piece_10 = extrude(amount=33.318735204, mode=Mode.PRIVATE)
    fillet13_piece_10 = fillet13_piece_10 - Plane(origin=(-17.7, -17.5, 16), x_dir=(1, 0, 0), z_dir=(0, 0, -1)) * Cylinder(1.9, 69, mode=Mode.PRIVATE)
    fillet13_piece_10 = fillet13_piece_10 - Plane(origin=(-17.7, -52.5, 16), x_dir=(-1, 0, 0), z_dir=(0, 0, -1)) * Cylinder(1.9, 69, mode=Mode.PRIVATE)
    add(fillet13_piece_10)
    with BuildSketch(Plane(origin=(14.6, -51.659367602, 16), x_dir=(0.7071067811865475, 0, -0.7071067811865475), z_dir=(0, 1, 0))) as fillet13_piece_11_section:
        with BuildLine():
            CenterArc((FILLET13_R * 0.414213562373, FILLET13_R), FILLET13_R, 225, 45)
            Line((-FILLET13_R * 0.292893218813, FILLET13_R * 0.292893218813), (0, 0))
            Line((0, 0), (FILLET13_R * 0.414213562373, 0))
        make_face()
    fillet13_piece_11 = extrude(amount=33.318735204, mode=Mode.PRIVATE)
    fillet13_piece_11 = fillet13_piece_11 - Plane(origin=(14.3, -52.5, 16), x_dir=(1, 0, 0), z_dir=(0, 0, -1)) * Cylinder(1.9, 69, mode=Mode.PRIVATE)
    fillet13_piece_11 = fillet13_piece_11 - Plane(origin=(14.3, -17.5, 16), x_dir=(-1, 0, 0), z_dir=(0, 0, -1)) * Cylinder(1.9, 69, mode=Mode.PRIVATE)
    add(fillet13_piece_11)


solid = part_1.part
